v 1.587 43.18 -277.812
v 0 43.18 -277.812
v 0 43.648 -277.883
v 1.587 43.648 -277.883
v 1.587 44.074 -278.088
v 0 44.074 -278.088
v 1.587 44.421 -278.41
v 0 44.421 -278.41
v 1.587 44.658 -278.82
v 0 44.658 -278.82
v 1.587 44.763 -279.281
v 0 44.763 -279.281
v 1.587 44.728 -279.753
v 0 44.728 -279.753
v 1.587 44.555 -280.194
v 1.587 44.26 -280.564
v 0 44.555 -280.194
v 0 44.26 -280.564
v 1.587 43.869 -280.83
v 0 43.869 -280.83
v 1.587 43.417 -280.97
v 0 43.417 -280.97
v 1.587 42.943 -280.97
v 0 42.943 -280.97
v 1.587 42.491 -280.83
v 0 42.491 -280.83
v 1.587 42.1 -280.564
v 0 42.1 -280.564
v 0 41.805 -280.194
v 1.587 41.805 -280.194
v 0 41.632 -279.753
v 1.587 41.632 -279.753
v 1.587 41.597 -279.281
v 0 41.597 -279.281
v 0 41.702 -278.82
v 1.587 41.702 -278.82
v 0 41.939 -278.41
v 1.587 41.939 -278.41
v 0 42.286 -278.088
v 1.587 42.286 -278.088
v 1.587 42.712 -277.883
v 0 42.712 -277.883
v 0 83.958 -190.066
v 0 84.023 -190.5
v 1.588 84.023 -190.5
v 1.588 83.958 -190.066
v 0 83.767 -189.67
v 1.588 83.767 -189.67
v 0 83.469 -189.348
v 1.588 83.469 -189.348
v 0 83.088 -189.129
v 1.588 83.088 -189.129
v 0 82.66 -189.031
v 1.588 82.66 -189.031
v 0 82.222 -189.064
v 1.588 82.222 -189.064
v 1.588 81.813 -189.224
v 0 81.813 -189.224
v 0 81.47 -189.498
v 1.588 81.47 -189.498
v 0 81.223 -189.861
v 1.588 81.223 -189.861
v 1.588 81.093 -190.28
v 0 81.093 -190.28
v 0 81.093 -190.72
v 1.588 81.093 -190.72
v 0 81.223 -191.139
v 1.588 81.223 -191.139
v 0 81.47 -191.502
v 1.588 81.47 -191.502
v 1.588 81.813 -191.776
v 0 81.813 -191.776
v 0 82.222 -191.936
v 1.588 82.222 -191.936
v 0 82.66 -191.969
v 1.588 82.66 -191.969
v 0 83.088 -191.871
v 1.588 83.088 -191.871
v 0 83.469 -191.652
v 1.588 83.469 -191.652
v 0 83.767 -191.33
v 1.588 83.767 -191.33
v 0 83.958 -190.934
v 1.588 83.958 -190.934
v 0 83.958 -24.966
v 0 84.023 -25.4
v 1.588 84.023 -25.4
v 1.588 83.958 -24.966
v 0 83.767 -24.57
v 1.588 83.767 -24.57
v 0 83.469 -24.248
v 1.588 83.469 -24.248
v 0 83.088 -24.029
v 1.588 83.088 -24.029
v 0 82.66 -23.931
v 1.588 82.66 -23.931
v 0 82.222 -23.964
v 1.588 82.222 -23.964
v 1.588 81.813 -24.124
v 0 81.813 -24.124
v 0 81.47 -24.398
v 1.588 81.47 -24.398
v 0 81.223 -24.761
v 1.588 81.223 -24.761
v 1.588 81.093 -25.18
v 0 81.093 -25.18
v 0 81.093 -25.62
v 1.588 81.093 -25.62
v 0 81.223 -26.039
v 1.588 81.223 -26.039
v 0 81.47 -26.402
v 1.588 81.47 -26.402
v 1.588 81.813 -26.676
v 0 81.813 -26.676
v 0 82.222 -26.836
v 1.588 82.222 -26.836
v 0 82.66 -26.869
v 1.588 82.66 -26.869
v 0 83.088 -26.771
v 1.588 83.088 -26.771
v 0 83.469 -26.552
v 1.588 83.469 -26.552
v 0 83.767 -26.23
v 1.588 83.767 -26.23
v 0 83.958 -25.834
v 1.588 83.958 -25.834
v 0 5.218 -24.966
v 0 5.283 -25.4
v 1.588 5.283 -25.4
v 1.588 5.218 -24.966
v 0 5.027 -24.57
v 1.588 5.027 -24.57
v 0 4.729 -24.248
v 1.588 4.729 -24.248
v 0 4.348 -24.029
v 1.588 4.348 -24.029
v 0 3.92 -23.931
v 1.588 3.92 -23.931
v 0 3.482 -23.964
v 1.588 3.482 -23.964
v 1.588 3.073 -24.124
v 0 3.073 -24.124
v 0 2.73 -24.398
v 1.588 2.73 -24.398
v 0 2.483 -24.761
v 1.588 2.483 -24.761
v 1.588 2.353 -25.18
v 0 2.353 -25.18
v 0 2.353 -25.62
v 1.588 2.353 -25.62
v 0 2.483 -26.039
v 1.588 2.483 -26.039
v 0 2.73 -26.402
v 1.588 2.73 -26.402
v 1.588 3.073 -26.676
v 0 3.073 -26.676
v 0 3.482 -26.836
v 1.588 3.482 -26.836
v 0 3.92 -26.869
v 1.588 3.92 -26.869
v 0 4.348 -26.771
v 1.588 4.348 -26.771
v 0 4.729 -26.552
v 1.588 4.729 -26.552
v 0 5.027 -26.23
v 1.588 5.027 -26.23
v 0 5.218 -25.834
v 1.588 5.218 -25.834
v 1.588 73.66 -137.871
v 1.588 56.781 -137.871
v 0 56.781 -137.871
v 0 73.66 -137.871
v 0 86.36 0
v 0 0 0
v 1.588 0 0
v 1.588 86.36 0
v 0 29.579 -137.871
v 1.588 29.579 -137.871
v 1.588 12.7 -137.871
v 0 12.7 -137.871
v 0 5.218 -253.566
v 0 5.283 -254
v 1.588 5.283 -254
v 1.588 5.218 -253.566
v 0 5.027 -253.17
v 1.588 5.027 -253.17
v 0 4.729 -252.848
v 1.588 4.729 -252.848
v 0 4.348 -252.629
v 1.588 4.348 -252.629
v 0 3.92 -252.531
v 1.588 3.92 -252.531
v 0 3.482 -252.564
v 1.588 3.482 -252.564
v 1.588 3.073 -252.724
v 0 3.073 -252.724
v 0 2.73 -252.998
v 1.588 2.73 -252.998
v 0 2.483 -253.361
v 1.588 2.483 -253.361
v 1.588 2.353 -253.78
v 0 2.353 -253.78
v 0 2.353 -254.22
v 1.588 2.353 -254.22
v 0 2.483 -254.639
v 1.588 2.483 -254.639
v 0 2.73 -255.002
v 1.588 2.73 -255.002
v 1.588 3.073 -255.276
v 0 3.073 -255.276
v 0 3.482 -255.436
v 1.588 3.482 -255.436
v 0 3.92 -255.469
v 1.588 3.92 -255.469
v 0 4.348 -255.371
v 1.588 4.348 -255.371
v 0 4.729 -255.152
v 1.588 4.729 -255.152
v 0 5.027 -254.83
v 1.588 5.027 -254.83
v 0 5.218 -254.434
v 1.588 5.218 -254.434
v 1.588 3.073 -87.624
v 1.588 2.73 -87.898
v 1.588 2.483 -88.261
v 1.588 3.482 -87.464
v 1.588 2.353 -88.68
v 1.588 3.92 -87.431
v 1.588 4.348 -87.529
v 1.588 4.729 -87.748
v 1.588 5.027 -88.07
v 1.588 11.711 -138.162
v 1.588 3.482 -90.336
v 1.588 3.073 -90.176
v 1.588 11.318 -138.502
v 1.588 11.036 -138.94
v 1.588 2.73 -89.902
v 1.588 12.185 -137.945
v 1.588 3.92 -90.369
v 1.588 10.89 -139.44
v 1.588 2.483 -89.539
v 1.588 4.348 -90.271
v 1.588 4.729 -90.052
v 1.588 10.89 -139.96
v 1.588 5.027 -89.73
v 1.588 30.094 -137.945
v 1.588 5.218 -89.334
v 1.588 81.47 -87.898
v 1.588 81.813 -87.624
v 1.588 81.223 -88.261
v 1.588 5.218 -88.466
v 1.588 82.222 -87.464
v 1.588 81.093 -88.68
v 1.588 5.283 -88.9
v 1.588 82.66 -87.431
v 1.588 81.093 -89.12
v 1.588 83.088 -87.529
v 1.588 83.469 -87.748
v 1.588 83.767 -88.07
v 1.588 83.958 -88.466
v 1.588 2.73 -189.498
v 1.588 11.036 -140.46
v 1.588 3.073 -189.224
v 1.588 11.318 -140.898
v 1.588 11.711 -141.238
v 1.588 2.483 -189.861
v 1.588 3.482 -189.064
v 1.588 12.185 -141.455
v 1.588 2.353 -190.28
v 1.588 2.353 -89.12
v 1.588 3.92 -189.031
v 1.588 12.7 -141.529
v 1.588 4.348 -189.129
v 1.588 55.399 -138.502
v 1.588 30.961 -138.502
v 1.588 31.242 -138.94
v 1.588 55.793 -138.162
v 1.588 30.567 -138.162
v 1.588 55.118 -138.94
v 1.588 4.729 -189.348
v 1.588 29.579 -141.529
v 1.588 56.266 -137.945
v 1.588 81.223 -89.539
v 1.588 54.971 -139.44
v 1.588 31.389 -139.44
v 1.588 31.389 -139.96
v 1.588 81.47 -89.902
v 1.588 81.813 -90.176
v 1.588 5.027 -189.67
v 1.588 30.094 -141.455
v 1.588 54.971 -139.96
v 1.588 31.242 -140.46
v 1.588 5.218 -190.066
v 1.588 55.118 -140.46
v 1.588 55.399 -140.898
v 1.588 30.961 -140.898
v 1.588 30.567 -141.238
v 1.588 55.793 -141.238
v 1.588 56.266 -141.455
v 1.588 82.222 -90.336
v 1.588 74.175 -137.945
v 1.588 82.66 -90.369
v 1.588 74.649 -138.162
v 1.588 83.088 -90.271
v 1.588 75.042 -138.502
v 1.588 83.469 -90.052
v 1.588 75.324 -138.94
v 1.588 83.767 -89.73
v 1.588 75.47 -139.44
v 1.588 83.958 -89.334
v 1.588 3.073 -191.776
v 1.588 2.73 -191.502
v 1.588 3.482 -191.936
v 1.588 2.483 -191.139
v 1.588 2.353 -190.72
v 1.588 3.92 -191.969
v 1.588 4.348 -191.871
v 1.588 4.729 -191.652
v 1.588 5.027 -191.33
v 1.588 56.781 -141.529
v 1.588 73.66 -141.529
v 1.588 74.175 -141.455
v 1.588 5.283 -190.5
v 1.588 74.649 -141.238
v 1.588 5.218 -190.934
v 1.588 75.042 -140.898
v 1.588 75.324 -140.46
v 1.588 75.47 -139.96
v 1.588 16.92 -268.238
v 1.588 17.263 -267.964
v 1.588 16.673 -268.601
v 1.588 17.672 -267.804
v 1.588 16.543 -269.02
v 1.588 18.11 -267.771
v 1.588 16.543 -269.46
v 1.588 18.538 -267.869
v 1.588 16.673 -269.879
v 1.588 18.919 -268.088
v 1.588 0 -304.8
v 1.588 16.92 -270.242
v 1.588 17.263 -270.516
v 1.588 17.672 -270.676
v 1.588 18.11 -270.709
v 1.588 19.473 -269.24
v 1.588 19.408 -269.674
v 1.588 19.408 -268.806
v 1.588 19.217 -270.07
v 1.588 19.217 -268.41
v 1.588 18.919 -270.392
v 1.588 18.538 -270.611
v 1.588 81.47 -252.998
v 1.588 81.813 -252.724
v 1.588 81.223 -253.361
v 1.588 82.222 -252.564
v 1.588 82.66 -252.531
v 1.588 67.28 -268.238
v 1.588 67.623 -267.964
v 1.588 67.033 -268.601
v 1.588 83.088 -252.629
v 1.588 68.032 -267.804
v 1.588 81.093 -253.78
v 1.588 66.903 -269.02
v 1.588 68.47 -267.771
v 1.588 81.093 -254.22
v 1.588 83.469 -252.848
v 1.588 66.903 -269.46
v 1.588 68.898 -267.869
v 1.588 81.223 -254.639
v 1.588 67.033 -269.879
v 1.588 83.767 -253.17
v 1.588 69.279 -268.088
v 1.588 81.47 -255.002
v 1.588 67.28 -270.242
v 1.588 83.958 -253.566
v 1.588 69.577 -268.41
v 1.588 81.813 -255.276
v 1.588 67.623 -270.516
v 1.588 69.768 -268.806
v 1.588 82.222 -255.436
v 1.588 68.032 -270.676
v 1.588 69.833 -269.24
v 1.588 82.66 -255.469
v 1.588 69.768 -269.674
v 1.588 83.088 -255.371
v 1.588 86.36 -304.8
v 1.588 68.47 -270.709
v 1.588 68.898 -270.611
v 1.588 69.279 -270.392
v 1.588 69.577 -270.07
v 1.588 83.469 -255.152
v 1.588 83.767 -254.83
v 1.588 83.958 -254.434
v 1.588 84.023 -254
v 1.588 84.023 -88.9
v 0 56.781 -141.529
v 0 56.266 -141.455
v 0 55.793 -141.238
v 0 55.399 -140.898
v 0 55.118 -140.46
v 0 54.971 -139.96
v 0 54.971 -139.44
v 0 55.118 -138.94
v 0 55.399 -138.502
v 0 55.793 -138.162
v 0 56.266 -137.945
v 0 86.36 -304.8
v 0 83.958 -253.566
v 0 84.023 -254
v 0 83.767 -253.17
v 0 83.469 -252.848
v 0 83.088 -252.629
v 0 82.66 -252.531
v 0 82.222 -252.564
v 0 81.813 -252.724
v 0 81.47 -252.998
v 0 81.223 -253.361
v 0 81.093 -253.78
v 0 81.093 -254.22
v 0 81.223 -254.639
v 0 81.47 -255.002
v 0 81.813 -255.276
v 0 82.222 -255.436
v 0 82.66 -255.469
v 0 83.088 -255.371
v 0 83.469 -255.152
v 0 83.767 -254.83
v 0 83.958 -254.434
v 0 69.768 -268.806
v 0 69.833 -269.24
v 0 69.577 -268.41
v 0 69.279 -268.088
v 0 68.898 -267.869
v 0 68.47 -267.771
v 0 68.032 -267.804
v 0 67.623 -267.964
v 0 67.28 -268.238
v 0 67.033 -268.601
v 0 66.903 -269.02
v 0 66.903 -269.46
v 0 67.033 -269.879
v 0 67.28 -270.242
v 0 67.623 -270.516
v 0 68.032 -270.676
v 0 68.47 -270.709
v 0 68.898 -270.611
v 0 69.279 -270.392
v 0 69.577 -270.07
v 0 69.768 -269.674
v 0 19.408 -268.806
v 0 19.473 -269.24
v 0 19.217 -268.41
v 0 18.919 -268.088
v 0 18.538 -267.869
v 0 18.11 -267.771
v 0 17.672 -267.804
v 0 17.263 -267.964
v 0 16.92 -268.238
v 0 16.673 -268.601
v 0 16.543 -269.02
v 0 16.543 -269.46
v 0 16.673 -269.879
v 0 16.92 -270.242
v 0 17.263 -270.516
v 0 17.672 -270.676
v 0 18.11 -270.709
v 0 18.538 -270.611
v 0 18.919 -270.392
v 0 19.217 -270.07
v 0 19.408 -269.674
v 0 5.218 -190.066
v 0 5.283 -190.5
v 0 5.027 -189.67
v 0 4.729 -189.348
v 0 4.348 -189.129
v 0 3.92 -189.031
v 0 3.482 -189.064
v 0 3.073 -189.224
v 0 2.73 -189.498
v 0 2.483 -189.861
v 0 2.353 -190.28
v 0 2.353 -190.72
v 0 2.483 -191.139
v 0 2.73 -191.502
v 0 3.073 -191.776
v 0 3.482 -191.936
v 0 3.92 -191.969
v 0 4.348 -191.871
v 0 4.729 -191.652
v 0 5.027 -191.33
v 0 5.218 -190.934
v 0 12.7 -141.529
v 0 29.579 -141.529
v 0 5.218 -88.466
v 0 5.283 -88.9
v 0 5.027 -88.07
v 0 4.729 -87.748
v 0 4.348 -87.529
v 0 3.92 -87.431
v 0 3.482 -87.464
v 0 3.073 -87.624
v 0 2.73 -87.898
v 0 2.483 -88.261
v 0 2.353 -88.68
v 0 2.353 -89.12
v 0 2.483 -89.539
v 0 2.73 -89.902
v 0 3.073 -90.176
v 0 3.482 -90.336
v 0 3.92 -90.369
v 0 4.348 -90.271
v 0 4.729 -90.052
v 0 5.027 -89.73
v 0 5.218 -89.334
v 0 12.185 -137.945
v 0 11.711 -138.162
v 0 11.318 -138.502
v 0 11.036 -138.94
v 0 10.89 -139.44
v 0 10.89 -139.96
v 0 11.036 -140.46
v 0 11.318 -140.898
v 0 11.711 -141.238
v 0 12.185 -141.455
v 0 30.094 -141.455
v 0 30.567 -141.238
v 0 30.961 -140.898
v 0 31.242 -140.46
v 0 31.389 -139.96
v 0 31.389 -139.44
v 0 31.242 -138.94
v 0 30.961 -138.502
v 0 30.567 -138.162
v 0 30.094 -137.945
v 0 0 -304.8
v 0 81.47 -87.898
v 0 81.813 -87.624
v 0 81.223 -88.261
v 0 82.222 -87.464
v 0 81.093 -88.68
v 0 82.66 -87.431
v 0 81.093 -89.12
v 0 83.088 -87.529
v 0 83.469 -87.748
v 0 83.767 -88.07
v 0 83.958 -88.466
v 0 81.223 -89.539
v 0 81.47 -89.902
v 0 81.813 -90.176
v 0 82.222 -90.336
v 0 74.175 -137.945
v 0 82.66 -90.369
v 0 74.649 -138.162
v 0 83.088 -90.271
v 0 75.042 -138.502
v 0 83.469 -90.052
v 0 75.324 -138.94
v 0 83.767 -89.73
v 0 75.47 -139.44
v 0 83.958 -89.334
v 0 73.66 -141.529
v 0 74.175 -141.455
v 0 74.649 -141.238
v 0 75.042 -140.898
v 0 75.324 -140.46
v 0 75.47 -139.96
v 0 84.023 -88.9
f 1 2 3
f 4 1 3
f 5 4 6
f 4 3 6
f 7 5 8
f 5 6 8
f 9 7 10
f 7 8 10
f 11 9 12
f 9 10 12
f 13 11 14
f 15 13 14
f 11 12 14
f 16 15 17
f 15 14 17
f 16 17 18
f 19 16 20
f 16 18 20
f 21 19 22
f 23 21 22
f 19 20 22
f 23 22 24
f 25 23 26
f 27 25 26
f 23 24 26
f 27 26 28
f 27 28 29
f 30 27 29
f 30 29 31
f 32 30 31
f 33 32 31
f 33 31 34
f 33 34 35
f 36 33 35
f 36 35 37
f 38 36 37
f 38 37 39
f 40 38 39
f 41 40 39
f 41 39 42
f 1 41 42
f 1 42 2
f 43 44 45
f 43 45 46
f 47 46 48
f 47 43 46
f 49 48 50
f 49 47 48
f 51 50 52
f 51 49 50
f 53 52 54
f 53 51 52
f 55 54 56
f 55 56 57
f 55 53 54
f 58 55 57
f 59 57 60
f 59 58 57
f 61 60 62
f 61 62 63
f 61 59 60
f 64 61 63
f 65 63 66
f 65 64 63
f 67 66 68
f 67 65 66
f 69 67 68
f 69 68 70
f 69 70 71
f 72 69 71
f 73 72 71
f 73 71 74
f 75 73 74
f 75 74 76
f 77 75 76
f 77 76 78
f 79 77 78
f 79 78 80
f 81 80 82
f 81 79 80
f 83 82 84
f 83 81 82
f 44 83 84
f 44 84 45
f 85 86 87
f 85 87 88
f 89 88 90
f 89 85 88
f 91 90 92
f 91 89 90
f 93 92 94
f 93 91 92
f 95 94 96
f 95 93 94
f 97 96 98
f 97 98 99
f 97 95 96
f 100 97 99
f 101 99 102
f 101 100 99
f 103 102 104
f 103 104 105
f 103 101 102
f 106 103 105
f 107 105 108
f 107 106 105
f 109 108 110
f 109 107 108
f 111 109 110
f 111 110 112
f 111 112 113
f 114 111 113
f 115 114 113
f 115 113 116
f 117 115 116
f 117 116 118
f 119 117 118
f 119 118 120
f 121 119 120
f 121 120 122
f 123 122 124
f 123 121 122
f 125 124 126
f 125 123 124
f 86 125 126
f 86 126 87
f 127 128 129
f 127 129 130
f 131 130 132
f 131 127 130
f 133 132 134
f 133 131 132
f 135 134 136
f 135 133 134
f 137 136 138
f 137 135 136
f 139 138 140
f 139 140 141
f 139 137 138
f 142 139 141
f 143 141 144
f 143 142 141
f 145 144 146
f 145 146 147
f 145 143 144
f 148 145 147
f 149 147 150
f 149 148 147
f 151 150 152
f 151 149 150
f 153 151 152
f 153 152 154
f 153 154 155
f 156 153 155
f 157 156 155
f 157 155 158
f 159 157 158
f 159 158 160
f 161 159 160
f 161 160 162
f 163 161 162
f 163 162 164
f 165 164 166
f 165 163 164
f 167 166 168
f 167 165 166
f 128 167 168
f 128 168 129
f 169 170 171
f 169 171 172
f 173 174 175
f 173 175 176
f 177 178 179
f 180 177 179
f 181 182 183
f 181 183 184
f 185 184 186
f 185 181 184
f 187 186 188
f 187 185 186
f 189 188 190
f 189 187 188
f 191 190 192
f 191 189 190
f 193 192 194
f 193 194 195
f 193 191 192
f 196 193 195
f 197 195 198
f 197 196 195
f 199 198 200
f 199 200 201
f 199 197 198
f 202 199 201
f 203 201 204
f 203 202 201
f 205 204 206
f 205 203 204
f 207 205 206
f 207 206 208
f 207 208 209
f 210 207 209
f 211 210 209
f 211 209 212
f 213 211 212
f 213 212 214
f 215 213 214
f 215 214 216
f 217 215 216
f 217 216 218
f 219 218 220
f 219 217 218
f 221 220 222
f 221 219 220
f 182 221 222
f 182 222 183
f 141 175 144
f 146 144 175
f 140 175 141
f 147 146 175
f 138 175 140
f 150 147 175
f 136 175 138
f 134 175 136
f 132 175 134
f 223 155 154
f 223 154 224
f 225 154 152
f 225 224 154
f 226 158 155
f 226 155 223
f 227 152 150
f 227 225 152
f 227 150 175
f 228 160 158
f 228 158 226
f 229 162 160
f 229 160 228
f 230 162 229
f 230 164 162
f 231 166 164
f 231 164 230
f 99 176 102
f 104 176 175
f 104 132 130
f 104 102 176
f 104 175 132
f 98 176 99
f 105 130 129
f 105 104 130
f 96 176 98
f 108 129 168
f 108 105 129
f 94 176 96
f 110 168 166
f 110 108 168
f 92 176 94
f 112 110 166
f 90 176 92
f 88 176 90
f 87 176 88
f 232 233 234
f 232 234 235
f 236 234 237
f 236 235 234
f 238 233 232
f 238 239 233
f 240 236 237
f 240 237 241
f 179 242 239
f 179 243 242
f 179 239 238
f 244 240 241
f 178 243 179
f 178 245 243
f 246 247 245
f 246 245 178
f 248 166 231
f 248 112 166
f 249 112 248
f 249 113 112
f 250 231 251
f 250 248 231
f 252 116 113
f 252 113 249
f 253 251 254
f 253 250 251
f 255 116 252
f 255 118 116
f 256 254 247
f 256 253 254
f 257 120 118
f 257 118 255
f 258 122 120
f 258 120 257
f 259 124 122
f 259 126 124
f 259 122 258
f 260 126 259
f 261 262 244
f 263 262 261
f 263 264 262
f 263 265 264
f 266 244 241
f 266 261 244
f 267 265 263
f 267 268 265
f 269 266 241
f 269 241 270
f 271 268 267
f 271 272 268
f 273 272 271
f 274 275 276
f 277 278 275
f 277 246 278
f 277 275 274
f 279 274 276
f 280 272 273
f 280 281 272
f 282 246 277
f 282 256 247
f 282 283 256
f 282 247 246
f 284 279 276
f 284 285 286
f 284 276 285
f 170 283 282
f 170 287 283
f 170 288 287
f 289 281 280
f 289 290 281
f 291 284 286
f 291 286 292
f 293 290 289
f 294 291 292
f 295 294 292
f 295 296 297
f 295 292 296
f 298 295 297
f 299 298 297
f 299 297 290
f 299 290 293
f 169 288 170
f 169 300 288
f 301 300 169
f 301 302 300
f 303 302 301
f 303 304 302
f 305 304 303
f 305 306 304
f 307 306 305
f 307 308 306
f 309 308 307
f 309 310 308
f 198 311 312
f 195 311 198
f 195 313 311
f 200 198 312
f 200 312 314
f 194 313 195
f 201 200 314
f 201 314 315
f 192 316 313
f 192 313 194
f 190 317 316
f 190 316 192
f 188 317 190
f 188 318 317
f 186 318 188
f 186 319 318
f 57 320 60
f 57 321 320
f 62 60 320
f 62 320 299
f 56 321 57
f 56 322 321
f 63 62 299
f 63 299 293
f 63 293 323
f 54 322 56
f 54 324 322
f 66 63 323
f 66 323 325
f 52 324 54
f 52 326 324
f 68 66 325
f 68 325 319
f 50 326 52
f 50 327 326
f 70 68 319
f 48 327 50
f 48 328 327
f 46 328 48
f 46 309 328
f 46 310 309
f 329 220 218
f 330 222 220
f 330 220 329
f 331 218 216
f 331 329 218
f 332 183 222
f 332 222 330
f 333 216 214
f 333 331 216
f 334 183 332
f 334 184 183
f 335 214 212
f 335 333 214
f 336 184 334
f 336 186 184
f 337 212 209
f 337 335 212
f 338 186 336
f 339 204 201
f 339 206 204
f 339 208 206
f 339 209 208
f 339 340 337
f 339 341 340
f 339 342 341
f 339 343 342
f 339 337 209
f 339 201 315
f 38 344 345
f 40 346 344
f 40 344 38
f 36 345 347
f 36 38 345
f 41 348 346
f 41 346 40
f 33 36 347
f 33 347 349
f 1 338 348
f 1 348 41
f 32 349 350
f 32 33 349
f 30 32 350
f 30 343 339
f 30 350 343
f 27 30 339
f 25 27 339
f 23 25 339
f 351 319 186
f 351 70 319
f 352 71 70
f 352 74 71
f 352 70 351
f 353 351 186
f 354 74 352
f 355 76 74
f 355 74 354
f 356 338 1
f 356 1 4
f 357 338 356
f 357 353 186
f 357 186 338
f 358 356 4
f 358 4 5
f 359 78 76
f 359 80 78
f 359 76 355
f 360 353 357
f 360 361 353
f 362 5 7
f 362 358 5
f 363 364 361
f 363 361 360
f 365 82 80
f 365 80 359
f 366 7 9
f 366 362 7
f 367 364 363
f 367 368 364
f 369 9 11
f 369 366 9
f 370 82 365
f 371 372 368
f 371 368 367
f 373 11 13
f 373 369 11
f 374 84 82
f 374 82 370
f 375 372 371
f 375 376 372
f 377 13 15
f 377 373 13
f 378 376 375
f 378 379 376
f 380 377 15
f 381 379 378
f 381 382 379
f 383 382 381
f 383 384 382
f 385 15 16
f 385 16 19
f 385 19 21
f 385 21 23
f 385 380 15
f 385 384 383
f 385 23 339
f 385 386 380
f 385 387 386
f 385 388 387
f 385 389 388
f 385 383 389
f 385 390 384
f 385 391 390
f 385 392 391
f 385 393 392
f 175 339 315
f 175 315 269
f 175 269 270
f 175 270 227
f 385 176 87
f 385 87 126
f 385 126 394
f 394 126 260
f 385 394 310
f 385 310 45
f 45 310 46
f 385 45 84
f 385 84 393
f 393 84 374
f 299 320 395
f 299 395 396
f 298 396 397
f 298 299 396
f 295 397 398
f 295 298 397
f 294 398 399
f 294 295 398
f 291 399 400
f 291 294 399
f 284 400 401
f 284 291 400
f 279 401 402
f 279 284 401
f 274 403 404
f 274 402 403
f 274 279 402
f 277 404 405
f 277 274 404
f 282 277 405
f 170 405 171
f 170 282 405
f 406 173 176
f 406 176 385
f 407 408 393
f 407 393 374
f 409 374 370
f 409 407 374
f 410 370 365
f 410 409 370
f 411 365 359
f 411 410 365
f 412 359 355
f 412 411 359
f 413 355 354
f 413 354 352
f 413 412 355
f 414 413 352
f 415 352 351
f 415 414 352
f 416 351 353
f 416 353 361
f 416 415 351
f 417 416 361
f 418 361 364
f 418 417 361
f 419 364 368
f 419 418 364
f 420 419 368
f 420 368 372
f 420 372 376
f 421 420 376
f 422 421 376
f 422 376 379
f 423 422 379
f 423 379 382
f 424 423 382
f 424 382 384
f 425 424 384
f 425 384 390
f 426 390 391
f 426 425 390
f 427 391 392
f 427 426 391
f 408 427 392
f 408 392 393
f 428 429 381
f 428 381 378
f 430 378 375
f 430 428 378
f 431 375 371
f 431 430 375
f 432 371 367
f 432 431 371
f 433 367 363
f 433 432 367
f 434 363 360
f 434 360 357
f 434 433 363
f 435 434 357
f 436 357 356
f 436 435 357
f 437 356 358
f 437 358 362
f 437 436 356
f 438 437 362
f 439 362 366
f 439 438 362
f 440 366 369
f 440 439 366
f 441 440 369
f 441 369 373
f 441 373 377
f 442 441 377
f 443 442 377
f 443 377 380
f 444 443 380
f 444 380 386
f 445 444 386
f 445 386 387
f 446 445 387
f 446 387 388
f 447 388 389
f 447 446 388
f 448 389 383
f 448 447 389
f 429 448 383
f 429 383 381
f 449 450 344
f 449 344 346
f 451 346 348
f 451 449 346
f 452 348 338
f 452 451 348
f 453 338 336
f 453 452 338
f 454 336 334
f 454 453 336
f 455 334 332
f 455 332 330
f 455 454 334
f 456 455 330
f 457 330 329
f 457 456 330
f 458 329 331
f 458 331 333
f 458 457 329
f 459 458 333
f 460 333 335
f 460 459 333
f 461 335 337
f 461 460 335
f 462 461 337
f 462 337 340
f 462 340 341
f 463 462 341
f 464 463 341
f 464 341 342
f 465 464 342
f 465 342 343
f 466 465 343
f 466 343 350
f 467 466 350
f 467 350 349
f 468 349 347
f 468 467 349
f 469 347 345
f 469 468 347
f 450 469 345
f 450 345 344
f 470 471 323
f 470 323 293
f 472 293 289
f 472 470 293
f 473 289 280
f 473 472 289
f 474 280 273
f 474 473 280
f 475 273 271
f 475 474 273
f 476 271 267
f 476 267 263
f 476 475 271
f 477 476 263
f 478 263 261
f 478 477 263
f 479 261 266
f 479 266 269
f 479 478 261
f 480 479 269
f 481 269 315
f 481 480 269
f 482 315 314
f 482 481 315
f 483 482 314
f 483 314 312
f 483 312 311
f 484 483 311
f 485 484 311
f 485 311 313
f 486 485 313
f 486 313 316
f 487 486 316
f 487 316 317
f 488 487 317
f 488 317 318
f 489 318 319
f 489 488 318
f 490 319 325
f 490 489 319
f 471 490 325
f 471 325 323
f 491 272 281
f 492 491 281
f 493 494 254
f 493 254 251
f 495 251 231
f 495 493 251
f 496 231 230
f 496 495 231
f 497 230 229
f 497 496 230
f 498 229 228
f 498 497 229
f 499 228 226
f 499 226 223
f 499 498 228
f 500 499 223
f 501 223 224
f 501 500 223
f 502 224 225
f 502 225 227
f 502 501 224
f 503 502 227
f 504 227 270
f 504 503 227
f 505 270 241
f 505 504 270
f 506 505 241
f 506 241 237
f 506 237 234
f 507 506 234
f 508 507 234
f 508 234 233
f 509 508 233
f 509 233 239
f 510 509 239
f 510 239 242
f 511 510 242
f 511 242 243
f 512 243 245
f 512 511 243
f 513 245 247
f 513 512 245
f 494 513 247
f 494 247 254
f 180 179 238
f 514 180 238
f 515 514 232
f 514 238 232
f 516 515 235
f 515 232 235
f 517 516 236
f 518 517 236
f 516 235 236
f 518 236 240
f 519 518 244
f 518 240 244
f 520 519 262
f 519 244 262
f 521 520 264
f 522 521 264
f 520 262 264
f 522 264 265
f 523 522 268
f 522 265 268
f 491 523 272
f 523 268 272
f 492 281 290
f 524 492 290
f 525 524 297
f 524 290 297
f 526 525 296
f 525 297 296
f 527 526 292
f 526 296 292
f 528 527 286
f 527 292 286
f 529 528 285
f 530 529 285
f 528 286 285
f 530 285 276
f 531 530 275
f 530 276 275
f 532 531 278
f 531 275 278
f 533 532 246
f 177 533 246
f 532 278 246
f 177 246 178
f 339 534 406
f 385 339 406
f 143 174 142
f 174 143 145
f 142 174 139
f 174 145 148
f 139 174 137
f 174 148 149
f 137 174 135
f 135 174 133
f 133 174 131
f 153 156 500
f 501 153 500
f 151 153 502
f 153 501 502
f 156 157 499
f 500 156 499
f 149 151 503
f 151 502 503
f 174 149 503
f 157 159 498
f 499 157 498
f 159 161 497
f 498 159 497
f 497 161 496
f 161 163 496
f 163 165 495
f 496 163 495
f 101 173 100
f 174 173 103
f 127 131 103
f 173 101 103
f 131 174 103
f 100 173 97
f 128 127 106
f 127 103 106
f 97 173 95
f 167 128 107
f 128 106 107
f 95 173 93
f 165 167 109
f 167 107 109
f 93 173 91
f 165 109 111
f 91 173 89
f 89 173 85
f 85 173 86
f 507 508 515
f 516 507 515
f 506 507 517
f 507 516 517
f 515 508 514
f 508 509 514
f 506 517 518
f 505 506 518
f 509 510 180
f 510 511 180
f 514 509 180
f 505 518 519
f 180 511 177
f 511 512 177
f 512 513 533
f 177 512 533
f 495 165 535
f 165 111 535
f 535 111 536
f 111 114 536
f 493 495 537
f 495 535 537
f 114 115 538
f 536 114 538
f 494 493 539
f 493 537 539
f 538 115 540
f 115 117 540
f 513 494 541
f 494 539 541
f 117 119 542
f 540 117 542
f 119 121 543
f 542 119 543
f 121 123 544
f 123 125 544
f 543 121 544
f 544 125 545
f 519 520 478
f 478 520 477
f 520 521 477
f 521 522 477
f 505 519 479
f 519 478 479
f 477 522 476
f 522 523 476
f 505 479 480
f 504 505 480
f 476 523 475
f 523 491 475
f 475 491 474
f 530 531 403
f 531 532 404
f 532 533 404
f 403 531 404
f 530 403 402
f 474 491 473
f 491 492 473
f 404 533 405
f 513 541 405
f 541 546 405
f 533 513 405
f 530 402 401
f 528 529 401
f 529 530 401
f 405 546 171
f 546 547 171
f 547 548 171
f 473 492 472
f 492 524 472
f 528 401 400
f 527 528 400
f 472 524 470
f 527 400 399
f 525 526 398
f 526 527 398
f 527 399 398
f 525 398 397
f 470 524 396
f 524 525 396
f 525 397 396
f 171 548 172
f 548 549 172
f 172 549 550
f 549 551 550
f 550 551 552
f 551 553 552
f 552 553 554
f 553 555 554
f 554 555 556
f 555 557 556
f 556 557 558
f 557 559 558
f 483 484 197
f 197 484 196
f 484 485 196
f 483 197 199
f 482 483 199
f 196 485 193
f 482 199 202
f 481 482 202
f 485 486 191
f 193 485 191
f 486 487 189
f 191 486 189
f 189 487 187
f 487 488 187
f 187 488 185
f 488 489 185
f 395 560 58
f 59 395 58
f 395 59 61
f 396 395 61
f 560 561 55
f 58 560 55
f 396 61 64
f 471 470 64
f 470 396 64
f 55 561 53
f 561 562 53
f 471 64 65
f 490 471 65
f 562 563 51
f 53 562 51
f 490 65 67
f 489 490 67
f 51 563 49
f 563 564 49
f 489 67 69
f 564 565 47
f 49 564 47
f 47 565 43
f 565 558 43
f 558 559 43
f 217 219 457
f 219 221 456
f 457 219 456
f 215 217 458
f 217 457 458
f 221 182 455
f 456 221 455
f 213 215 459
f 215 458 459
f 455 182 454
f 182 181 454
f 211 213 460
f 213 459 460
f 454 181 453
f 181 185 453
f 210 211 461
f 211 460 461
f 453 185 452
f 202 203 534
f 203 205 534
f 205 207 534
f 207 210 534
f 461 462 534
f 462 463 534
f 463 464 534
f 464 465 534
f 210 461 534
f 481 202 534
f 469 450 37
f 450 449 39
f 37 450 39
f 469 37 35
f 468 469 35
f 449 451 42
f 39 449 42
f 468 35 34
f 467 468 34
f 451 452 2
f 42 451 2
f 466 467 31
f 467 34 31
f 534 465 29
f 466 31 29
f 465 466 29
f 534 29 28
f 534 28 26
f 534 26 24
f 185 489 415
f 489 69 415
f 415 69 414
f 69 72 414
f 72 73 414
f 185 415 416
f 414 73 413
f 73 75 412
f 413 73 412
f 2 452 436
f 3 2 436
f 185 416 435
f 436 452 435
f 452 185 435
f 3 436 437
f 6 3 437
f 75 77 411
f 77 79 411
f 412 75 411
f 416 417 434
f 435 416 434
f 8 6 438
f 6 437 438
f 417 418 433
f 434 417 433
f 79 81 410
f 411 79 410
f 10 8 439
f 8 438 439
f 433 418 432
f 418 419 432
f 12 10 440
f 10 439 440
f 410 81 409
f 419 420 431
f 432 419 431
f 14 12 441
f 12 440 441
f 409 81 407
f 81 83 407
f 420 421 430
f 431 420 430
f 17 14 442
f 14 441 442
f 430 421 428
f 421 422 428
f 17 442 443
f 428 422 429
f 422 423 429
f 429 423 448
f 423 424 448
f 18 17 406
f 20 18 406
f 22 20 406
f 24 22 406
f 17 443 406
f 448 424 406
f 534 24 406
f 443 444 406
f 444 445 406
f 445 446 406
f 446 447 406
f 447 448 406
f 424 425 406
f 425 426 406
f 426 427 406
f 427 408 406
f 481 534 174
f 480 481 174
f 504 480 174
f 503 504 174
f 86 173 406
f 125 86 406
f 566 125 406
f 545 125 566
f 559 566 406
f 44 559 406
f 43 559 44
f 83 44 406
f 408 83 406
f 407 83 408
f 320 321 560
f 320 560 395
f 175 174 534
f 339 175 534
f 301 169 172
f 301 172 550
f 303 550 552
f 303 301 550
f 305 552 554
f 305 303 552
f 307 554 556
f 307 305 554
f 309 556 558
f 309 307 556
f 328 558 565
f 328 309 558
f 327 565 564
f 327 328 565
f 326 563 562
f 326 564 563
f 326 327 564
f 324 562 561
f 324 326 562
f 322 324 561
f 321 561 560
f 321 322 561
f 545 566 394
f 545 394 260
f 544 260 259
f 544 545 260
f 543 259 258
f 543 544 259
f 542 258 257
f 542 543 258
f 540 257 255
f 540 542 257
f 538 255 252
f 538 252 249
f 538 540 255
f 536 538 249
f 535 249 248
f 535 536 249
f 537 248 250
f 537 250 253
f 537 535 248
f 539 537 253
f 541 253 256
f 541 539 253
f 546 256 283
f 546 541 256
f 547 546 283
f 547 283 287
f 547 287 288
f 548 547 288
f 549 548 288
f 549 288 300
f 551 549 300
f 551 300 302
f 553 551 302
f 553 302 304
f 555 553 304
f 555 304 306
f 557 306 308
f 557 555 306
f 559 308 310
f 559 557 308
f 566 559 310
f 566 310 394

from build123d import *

# Parameters (mm, degrees)
SKETCH1_W                     = 304.8
SKETCH1_H                     = 86.36
BOSS_EXTRUDE1_DEPTH           = 1.5875
F_4_CLEARANCE_HOLE1_OUTLINE_R = 1.4732
F_4_CLEARANCE_HOLE1_DEPTH     = 1.5875
F_1_8_0_125_DIAMETER_HOLE1_D  = 3.175
CUT_EXTRUDE1_DEPTH            = 317.802161855


# Read off the part's stored shape, not the designer's step: #4 Clearance Hole1
with BuildPart() as part:
    # Sketch1 → Boss-Extrude1 (new body)
    with BuildSketch(Plane(origin=(0, 0, 0), x_dir=(0, 0, -1), z_dir=(1, 0, 0))):
        with Locations((152.4, 43.18)):
            Rectangle(SKETCH1_W, SKETCH1_H)
    extrude(amount=BOSS_EXTRUDE1_DEPTH)

    # #4 Clearance Hole1 outline → #4 Clearance Hole1 (cut)
    with BuildSketch(Plane.YZ):
        with Locations((68.36, -269.24)):
            Circle(F_4_CLEARANCE_HOLE1_OUTLINE_R)
        with Locations((18, -269.24)):
            Circle(F_4_CLEARANCE_HOLE1_OUTLINE_R)
        with Locations((82.55, -25.4)):
            Circle(F_4_CLEARANCE_HOLE1_OUTLINE_R)
        with Locations((82.55, -88.9)):
            Circle(F_4_CLEARANCE_HOLE1_OUTLINE_R)
        with Locations((82.55, -190.5)):
            Circle(F_4_CLEARANCE_HOLE1_OUTLINE_R)
        with Locations((82.55, -254)):
            Circle(F_4_CLEARANCE_HOLE1_OUTLINE_R)
        with Locations((3.81, -254)):
            Circle(F_4_CLEARANCE_HOLE1_OUTLINE_R)
        with Locations((3.81, -190.5)):
            Circle(F_4_CLEARANCE_HOLE1_OUTLINE_R)
        with Locations((3.81, -88.9)):
            Circle(F_4_CLEARANCE_HOLE1_OUTLINE_R)
        with Locations((3.81, -25.4)):
            Circle(F_4_CLEARANCE_HOLE1_OUTLINE_R)
    extrude(amount=F_4_CLEARANCE_HOLE1_DEPTH, mode=Mode.SUBTRACT)

    # 1/8 (0.125) Diameter Hole1 (through all)
    with Locations(Plane(origin=(1.5875, 0, 0), x_dir=(0, 0, -1), z_dir=(1, 0, 0))):
        with Locations((279.4, 43.18)):
            Hole(F_1_8_0_125_DIAMETER_HOLE1_D / 2)

    # Sketch6 → Cut-Extrude1 (cut, through all)
    with BuildSketch(Plane(origin=(1.5875, 0, 0), x_dir=(0, 0, -1), z_dir=(1, 0, 0))):
        with BuildLine():
            Line((141.5288, 73.66), (141.5288, 56.781492032))
            ThreePointArc((141.5288, 56.781492032), (139.7, 54.952692032), (137.8712, 56.781492032))
            Line((137.8712, 56.781492032), (137.8712, 73.66))
            ThreePointArc((137.8712, 73.66), (139.7, 75.4888), (141.5288, 73.66))
        make_face()
        with BuildLine():
            Line((141.5288, 12.7), (141.5288, 29.578507968))
            ThreePointArc((141.5288, 29.578507968), (139.7, 31.407307968), (137.8712, 29.578507968))
            Line((137.8712, 29.578507968), (137.8712, 12.7))
            ThreePointArc((137.8712, 12.7), (139.7, 10.8712), (141.5288, 12.7))
        make_face()
    extrude(amount=-CUT_EXTRUDE1_DEPTH, mode=Mode.SUBTRACT)


solid = part.part
